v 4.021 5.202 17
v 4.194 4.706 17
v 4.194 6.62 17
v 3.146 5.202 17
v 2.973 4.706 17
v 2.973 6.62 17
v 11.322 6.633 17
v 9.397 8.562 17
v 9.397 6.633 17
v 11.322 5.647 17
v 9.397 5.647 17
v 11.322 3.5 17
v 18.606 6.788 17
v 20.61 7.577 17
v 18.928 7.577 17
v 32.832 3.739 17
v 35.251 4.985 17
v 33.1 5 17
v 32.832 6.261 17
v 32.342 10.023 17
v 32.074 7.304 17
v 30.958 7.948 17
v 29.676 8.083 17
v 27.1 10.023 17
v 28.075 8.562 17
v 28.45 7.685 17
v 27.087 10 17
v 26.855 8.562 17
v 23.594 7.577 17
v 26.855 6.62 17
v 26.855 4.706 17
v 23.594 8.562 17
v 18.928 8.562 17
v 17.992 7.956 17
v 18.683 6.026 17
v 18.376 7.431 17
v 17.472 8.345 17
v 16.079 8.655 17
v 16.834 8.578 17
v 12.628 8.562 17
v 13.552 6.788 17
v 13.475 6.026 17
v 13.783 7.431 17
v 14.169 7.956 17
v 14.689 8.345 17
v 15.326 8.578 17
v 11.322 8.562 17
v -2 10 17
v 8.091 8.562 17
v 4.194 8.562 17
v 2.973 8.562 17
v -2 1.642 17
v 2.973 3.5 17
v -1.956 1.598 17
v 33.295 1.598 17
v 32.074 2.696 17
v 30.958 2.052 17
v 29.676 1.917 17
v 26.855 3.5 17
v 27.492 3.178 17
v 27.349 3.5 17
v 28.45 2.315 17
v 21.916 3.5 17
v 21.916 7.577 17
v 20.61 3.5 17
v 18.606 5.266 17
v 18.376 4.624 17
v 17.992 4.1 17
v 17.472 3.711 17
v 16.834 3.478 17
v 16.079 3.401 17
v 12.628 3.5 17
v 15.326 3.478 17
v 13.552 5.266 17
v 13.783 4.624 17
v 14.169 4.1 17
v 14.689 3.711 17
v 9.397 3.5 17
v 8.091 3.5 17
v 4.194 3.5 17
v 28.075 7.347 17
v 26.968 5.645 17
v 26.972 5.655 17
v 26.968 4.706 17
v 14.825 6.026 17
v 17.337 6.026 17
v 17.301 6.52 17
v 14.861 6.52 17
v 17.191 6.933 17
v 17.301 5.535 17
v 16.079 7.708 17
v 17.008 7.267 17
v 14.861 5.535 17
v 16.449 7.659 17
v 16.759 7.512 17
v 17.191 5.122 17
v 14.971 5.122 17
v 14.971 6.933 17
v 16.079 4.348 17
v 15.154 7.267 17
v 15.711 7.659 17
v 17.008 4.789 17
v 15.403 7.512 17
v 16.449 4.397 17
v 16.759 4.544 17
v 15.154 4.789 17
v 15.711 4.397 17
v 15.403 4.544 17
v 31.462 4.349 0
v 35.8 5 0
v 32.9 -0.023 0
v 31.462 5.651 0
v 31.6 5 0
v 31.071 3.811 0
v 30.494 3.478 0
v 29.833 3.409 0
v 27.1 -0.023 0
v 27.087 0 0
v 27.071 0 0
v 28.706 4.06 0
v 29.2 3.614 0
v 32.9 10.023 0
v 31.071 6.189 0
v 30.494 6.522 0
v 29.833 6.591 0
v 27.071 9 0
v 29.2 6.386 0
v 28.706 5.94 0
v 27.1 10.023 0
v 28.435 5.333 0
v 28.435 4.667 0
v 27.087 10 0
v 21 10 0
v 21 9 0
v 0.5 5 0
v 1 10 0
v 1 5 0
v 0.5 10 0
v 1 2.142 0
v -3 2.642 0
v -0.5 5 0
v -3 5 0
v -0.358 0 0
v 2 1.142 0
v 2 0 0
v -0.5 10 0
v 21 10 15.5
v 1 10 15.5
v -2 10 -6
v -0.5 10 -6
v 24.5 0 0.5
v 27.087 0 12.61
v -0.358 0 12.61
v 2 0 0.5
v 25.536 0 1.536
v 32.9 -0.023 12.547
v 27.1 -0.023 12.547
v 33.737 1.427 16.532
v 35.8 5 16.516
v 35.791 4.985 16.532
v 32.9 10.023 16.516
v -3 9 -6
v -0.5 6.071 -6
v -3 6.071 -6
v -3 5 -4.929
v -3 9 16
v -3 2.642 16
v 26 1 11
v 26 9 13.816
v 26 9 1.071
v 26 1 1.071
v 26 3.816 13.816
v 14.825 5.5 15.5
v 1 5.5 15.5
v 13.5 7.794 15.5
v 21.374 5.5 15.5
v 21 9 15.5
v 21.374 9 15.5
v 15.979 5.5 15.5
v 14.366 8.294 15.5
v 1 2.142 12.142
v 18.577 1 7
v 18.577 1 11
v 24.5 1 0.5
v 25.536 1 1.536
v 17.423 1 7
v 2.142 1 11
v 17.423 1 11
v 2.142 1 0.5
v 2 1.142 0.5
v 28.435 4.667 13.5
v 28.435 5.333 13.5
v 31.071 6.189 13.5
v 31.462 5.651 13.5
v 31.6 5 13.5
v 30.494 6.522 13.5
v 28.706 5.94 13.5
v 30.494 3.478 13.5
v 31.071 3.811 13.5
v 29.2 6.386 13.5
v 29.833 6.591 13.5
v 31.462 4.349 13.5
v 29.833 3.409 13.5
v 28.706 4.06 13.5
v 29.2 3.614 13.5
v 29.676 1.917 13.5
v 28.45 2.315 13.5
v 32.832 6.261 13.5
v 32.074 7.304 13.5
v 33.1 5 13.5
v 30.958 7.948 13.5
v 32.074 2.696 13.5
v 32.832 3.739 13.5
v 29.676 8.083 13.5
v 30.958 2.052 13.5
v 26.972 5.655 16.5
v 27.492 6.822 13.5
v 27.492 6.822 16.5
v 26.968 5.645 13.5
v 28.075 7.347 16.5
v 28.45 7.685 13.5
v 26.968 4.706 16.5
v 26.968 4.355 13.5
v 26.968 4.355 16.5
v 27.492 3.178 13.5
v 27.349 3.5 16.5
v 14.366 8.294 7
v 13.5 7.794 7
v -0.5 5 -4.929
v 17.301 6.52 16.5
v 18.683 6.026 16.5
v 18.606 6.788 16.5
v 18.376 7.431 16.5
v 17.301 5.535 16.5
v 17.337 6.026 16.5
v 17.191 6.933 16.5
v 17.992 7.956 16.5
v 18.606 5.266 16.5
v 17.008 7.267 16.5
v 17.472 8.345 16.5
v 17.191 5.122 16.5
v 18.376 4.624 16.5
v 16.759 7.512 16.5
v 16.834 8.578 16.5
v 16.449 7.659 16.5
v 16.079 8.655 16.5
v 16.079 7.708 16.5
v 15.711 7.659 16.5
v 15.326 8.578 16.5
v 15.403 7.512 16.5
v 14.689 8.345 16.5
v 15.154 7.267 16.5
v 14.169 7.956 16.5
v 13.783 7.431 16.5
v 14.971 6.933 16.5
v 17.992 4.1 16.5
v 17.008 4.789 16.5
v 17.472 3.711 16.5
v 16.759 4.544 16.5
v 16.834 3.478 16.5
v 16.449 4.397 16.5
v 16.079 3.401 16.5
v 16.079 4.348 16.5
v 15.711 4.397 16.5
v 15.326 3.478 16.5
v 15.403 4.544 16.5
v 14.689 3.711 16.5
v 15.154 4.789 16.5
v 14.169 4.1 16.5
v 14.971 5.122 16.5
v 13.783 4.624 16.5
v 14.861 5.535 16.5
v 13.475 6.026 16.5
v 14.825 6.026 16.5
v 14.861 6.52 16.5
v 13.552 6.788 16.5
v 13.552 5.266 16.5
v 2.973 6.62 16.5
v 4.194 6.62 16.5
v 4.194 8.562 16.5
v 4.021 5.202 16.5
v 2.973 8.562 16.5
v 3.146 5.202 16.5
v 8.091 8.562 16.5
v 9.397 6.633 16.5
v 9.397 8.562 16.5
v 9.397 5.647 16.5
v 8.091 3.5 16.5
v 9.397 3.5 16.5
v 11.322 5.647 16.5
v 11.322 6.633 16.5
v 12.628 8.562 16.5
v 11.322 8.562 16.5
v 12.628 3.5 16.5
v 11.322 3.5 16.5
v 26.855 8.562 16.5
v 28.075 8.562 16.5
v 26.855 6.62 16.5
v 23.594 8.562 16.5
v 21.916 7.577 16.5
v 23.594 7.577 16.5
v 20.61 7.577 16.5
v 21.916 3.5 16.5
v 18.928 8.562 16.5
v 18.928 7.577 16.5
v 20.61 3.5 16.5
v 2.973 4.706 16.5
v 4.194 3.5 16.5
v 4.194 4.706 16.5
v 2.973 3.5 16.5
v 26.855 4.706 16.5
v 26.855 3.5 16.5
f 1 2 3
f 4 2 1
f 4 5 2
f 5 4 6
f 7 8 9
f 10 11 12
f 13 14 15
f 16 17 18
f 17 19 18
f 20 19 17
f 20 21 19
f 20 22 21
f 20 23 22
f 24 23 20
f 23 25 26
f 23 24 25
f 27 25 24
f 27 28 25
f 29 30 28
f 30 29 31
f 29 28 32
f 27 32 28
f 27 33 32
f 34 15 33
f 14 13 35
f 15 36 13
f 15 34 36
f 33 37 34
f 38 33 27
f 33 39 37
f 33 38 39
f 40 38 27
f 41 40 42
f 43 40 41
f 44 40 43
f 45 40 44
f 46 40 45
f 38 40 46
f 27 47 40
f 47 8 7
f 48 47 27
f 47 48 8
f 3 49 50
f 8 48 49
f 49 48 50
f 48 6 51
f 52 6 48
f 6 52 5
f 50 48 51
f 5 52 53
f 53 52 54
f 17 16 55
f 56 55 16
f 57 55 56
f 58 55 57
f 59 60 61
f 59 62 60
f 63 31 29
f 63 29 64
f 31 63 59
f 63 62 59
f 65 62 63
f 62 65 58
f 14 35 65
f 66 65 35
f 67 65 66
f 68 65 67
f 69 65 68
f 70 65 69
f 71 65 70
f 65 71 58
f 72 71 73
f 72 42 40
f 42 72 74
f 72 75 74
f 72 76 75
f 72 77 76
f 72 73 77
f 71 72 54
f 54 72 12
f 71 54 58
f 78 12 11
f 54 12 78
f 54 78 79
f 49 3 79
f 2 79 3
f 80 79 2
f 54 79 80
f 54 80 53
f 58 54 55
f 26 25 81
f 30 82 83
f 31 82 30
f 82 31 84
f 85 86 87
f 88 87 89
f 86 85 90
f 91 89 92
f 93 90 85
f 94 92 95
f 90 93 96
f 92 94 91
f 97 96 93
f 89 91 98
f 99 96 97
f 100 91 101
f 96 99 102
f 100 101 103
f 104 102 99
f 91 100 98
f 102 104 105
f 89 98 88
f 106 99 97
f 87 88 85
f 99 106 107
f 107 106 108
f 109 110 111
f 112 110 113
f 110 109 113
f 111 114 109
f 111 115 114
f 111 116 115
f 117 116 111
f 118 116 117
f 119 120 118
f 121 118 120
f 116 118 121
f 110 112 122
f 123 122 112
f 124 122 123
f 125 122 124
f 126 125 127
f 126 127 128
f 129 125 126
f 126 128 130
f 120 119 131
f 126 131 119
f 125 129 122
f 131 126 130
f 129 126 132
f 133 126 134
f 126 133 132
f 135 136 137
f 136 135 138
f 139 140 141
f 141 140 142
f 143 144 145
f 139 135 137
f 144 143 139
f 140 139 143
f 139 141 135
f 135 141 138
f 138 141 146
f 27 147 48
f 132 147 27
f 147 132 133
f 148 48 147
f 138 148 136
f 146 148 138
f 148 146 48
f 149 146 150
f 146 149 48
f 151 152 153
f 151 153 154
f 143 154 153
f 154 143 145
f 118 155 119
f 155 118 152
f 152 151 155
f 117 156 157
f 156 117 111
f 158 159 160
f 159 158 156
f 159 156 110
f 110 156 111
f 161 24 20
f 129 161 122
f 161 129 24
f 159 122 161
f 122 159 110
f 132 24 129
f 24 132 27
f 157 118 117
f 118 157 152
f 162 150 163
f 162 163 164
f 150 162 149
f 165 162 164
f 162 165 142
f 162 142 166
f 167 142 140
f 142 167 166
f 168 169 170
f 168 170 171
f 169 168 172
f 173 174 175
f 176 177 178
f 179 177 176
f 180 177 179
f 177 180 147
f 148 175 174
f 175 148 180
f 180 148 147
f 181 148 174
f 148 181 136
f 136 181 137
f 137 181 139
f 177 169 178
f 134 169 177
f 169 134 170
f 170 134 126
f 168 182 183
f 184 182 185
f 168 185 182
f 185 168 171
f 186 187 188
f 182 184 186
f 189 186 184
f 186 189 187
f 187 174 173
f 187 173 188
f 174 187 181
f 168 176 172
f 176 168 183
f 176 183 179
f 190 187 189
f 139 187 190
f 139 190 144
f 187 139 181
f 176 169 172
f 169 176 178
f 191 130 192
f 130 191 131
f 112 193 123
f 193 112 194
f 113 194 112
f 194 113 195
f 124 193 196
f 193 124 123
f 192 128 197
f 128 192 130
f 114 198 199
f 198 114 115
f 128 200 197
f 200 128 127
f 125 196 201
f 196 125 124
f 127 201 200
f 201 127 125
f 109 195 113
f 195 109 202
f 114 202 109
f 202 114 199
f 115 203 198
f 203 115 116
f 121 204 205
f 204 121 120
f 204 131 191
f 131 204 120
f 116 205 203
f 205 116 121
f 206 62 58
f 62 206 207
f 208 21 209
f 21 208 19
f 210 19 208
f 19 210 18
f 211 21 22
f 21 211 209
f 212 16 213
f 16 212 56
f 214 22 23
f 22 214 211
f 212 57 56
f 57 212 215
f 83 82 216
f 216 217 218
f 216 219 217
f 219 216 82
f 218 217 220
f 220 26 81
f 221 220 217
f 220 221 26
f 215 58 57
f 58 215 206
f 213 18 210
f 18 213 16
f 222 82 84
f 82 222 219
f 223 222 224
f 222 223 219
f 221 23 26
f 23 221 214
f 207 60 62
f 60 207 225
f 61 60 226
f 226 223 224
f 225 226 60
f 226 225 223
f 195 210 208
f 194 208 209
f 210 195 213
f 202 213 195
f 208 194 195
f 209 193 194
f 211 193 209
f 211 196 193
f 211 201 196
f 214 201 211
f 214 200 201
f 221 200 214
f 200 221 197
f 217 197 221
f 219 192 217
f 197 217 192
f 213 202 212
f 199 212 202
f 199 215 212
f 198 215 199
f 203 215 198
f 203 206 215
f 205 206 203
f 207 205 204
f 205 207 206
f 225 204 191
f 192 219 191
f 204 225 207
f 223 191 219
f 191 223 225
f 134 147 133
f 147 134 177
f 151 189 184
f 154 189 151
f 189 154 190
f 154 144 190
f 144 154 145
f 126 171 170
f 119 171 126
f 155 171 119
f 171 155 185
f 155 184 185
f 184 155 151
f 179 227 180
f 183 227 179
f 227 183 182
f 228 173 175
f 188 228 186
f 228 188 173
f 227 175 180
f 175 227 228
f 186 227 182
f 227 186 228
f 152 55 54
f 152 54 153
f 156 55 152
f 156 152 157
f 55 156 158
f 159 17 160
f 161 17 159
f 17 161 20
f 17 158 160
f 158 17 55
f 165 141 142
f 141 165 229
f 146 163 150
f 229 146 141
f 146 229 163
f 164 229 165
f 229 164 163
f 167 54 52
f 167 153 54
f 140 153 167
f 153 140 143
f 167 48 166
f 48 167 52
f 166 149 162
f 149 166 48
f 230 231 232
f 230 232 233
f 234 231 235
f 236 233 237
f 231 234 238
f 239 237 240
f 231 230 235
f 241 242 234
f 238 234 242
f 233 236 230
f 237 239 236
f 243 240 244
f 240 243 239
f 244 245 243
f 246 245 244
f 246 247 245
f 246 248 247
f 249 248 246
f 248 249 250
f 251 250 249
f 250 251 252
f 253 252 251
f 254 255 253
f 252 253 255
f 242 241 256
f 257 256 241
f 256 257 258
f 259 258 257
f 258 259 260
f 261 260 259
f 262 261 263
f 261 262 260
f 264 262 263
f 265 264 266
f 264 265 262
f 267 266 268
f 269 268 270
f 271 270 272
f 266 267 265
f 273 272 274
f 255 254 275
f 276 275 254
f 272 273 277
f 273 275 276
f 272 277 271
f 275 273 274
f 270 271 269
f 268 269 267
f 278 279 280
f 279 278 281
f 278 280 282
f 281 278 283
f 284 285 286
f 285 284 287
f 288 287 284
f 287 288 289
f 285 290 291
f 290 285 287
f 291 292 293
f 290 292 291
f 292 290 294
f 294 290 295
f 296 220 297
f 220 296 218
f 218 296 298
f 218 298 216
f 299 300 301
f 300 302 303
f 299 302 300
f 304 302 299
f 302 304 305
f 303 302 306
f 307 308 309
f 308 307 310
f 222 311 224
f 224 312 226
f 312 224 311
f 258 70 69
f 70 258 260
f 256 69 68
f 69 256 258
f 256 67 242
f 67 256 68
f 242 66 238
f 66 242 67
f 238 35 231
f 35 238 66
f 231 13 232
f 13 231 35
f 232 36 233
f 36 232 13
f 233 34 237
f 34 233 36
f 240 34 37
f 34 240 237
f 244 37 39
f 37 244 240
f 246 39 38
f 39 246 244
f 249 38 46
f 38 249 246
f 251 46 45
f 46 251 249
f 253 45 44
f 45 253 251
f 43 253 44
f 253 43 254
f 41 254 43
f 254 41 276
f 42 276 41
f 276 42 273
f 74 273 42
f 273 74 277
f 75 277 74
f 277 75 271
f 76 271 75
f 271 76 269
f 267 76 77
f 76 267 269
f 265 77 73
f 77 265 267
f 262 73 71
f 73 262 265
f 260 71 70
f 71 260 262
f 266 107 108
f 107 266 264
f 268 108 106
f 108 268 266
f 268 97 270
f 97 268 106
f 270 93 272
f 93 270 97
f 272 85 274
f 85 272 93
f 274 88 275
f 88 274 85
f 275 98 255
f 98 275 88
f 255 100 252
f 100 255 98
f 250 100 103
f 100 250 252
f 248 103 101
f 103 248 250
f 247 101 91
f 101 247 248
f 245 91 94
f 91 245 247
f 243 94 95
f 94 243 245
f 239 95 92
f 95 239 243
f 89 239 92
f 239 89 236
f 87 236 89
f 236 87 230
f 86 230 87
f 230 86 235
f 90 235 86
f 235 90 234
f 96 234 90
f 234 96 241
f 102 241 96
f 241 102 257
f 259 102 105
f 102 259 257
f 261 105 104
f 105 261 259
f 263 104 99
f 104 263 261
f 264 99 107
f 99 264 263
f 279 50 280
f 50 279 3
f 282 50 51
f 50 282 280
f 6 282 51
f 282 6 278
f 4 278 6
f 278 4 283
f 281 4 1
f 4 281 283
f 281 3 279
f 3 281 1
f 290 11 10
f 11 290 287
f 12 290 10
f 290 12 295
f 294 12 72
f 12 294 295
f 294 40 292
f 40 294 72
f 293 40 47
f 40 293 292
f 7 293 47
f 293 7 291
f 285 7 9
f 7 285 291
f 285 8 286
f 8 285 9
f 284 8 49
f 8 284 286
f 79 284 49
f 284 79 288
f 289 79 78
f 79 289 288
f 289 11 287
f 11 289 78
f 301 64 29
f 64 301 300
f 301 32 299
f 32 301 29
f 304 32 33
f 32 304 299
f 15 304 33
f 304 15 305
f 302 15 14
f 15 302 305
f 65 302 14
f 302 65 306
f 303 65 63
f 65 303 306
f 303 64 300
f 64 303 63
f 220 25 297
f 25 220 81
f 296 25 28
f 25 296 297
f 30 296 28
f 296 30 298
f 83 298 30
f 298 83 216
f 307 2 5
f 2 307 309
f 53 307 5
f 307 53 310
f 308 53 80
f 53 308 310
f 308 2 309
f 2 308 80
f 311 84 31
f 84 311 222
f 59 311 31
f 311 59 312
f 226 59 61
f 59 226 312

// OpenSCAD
// nozzle for Prusa i3 MK2 and LibreMatter UMO+ E3D mount
// from LibreMatter
// burdickjp@protonmail.com

module fan_nozzle(){
    
    difference(){    
        union(){
            cube([32,10,17]); // Main cube
            translate([30,5,0])cylinder(r=5.8,h = 17, $fn=6);    
            translate([-3,0,-6]) cube([3,10,23]);
            
        }
        // Mounting screw
        translate([30,5,-10])cylinder(r=3.2/2,h = 24.5-0.2, $fn=15); // Screw cut
        translate([30,5,17-3.5])cylinder(r=3.1,h = 20, $fn=15); // head cut

        // Fan entry hole
        translate([1,10-1.5,-1])cube([20,3,16.5]);
        translate([1,10-1.5,-1-5])cube([18,3,16.5]);
    
        // Airway cutout
        difference(){    
            translate([1,1,-1])cube([25,8,16.5]);    
            translate([0,0,10])rotate([45,0,0])cube([30,8,16.5]);    
            translate([-1,-10,-1])rotate([0,0,45])cube([10,8,30]); 
            translate([20,0,16])rotate([0,20,0])cube([10,20,10]);    
        }
        translate([2,-1,-4.5])cube([24,3,5]);
        translate([22,-1,-2])rotate([0,45,0])cube([5,10,5]);
    
    }

    // Air director
    translate([18,0,7])rotate([0,0,30])cube([1,9,10]);


}

module fancy_corners(){
    
    translate([-10,-10.5,13])rotate([-20,0,0])cube([50,10,15]);
    translate([-16,-10.5,17.5])rotate([0,45,0])cube([10,30,15]);
    
    translate([46.5,-10.5,15])rotate([0,-45,30])cube([10,30,15]);
    translate([28.62,-10.5,15])rotate([0,-45,-30])cube([10,30,15]);

    translate([-5,-1,-7])rotate([0,0,0]) cube([10,6,7]);
    translate([-0.5,-1,-7])rotate([0,0,0]) cube([1,15,7]);
    translate([-5,4,-11])rotate([45,0,0]) cube([10,5,5]);

    //left cut
    translate([-6.5,-8,-5])rotate([0,0,45])cube([10,10,45]);
    translate([-7,-5,12])rotate([0,-45,0])cube([10,30,15]);
    
    translate([-7,5,-10])rotate([0,0,45])cube([10,10,35]);
    
    }

module fan_n(){
    difference(){
        fan_nozzle();
        fancy_corners();    
        translate([2,3.5,16.5])linear_extrude(height = 0.6) {text("! HOT !", size = 5, font = "Helvetica Neue:style=Bold");}
    }
}

fan_n();
